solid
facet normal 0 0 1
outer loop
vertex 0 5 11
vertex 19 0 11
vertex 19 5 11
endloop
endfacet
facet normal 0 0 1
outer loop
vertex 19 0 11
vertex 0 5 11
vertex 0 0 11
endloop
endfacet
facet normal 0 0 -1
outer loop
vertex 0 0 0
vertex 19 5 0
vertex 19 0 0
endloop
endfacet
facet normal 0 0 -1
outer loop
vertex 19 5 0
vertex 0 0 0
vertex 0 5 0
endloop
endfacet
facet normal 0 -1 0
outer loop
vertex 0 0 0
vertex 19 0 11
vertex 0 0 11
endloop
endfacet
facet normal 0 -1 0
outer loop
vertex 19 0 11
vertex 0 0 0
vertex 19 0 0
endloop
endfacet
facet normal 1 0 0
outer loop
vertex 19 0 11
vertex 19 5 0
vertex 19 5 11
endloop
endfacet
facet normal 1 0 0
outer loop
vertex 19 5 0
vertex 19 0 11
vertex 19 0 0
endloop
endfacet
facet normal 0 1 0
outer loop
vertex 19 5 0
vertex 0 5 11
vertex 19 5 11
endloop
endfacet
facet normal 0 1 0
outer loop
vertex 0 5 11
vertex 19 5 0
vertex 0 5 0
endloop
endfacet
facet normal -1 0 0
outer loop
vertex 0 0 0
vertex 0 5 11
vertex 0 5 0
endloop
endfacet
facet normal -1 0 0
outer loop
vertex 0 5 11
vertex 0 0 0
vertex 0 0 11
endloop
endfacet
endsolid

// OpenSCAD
// Generated by SolidPython 1.0.1 on 2020-07-29 00:46:56


cube(size = [19, 5, 11]);
/***********************************************
*********      SolidPython code:      **********
************************************************
 
# import packages: SolidPython
from solid import *
from solid.utils import *
from itertools import chain, combinations, permutations


class Resize:

    def __init__(self, scad_file):
        self.scad_file = scad_file
        #self.scad_file = import_scad(scad_file)
        # cone/cylinder param:
        self.r1 = 0
        self.r2 = 0
        self.h = 0
        # rectangular prism param:
        self.w = 0
        self.l = 0
        # ellipse param:
        self.r = 0

    # import OpenScad code (file name corresponds to shape)


    # classify shape + parameters
    def assign(self, param1, param2, param3):
        if self.scad_file == 'cone.scad':
            self.r1 = param1
            self.r2 = param2
            self.h = param3
        elif self.scad_file == 'cylinder.scad':
            self.r1 = param1
            self.r2 = param2
            self.h = param3
        elif self.scad_file == 'rectangularPrism.scad':
            self.h = param1
            self.l = param2
            self.w = param3
        else:
            self.r = param1
            self.h = param2

    # resize parameters
    def iterate(self):
        x = range(3, 20, 2)
        i = 1
        if self.scad_file == 'cone.scad':
            tempList = list(permutations(x, 2))
            for temp in tempList:
                param1 = temp[0]
                param2 = temp[1]
                filepath = 'produced_scad_files/' + 'cone' + str(param1) + '_' + str(param2) + '_' + '.scad'
                scad_render_to_file(cylinder(h=param1, r1=param2, r2=0), filepath)

        elif self.scad_file == 'cylinder.scad':
            tempList = list(permutations(x, 3))
            for temp in tempList:
                param1 = temp[0]
                param2 = temp[1]
                filepath = 'produced_scad_files/' + 'cylinder' + str(param1) + '_' + str(param2) + '_' + '.scad'
                scad_render_to_file(cylinder(h=param1, r1=param2, r2=param2), filepath)

        elif self.scad_file == 'rectangularPrism.scad':
            tempList = list(permutations(x, 3))
            for temp in tempList:
                param1 = temp[0]
                param2 = temp[1]
                param3 = temp[2]
                filepath = 'produced_scad_files/' + 'rectangularPrism' + str(param1) + '_' + str(param2) + '_' + str(
                    param3) + '.scad'
                scad_render_to_file(cube(size=(param1, param2, param3)), filepath)

        elif self.scad_file == 'ellipse.scad':
            tempList = list(permutations(x, 4))
            for temp in tempList:
                param1 = temp[0]
                param2 = temp[1]
                param3 = temp[2]
                param4 = temp[3]
                filepath = 'produced_scad_files/' + 'ellipse' + str(param1) + '_' + str(param2) + '_' + str(param3) + '_' + str(param4) + '.scad'
                scad_render_to_file(scale([param1, param2, param3])(sphere(r=param4)), filepath)

    def render_to_scadfile(self):
        scad_render_to_file(scad, 'example.scad') 
 
************************************************/
